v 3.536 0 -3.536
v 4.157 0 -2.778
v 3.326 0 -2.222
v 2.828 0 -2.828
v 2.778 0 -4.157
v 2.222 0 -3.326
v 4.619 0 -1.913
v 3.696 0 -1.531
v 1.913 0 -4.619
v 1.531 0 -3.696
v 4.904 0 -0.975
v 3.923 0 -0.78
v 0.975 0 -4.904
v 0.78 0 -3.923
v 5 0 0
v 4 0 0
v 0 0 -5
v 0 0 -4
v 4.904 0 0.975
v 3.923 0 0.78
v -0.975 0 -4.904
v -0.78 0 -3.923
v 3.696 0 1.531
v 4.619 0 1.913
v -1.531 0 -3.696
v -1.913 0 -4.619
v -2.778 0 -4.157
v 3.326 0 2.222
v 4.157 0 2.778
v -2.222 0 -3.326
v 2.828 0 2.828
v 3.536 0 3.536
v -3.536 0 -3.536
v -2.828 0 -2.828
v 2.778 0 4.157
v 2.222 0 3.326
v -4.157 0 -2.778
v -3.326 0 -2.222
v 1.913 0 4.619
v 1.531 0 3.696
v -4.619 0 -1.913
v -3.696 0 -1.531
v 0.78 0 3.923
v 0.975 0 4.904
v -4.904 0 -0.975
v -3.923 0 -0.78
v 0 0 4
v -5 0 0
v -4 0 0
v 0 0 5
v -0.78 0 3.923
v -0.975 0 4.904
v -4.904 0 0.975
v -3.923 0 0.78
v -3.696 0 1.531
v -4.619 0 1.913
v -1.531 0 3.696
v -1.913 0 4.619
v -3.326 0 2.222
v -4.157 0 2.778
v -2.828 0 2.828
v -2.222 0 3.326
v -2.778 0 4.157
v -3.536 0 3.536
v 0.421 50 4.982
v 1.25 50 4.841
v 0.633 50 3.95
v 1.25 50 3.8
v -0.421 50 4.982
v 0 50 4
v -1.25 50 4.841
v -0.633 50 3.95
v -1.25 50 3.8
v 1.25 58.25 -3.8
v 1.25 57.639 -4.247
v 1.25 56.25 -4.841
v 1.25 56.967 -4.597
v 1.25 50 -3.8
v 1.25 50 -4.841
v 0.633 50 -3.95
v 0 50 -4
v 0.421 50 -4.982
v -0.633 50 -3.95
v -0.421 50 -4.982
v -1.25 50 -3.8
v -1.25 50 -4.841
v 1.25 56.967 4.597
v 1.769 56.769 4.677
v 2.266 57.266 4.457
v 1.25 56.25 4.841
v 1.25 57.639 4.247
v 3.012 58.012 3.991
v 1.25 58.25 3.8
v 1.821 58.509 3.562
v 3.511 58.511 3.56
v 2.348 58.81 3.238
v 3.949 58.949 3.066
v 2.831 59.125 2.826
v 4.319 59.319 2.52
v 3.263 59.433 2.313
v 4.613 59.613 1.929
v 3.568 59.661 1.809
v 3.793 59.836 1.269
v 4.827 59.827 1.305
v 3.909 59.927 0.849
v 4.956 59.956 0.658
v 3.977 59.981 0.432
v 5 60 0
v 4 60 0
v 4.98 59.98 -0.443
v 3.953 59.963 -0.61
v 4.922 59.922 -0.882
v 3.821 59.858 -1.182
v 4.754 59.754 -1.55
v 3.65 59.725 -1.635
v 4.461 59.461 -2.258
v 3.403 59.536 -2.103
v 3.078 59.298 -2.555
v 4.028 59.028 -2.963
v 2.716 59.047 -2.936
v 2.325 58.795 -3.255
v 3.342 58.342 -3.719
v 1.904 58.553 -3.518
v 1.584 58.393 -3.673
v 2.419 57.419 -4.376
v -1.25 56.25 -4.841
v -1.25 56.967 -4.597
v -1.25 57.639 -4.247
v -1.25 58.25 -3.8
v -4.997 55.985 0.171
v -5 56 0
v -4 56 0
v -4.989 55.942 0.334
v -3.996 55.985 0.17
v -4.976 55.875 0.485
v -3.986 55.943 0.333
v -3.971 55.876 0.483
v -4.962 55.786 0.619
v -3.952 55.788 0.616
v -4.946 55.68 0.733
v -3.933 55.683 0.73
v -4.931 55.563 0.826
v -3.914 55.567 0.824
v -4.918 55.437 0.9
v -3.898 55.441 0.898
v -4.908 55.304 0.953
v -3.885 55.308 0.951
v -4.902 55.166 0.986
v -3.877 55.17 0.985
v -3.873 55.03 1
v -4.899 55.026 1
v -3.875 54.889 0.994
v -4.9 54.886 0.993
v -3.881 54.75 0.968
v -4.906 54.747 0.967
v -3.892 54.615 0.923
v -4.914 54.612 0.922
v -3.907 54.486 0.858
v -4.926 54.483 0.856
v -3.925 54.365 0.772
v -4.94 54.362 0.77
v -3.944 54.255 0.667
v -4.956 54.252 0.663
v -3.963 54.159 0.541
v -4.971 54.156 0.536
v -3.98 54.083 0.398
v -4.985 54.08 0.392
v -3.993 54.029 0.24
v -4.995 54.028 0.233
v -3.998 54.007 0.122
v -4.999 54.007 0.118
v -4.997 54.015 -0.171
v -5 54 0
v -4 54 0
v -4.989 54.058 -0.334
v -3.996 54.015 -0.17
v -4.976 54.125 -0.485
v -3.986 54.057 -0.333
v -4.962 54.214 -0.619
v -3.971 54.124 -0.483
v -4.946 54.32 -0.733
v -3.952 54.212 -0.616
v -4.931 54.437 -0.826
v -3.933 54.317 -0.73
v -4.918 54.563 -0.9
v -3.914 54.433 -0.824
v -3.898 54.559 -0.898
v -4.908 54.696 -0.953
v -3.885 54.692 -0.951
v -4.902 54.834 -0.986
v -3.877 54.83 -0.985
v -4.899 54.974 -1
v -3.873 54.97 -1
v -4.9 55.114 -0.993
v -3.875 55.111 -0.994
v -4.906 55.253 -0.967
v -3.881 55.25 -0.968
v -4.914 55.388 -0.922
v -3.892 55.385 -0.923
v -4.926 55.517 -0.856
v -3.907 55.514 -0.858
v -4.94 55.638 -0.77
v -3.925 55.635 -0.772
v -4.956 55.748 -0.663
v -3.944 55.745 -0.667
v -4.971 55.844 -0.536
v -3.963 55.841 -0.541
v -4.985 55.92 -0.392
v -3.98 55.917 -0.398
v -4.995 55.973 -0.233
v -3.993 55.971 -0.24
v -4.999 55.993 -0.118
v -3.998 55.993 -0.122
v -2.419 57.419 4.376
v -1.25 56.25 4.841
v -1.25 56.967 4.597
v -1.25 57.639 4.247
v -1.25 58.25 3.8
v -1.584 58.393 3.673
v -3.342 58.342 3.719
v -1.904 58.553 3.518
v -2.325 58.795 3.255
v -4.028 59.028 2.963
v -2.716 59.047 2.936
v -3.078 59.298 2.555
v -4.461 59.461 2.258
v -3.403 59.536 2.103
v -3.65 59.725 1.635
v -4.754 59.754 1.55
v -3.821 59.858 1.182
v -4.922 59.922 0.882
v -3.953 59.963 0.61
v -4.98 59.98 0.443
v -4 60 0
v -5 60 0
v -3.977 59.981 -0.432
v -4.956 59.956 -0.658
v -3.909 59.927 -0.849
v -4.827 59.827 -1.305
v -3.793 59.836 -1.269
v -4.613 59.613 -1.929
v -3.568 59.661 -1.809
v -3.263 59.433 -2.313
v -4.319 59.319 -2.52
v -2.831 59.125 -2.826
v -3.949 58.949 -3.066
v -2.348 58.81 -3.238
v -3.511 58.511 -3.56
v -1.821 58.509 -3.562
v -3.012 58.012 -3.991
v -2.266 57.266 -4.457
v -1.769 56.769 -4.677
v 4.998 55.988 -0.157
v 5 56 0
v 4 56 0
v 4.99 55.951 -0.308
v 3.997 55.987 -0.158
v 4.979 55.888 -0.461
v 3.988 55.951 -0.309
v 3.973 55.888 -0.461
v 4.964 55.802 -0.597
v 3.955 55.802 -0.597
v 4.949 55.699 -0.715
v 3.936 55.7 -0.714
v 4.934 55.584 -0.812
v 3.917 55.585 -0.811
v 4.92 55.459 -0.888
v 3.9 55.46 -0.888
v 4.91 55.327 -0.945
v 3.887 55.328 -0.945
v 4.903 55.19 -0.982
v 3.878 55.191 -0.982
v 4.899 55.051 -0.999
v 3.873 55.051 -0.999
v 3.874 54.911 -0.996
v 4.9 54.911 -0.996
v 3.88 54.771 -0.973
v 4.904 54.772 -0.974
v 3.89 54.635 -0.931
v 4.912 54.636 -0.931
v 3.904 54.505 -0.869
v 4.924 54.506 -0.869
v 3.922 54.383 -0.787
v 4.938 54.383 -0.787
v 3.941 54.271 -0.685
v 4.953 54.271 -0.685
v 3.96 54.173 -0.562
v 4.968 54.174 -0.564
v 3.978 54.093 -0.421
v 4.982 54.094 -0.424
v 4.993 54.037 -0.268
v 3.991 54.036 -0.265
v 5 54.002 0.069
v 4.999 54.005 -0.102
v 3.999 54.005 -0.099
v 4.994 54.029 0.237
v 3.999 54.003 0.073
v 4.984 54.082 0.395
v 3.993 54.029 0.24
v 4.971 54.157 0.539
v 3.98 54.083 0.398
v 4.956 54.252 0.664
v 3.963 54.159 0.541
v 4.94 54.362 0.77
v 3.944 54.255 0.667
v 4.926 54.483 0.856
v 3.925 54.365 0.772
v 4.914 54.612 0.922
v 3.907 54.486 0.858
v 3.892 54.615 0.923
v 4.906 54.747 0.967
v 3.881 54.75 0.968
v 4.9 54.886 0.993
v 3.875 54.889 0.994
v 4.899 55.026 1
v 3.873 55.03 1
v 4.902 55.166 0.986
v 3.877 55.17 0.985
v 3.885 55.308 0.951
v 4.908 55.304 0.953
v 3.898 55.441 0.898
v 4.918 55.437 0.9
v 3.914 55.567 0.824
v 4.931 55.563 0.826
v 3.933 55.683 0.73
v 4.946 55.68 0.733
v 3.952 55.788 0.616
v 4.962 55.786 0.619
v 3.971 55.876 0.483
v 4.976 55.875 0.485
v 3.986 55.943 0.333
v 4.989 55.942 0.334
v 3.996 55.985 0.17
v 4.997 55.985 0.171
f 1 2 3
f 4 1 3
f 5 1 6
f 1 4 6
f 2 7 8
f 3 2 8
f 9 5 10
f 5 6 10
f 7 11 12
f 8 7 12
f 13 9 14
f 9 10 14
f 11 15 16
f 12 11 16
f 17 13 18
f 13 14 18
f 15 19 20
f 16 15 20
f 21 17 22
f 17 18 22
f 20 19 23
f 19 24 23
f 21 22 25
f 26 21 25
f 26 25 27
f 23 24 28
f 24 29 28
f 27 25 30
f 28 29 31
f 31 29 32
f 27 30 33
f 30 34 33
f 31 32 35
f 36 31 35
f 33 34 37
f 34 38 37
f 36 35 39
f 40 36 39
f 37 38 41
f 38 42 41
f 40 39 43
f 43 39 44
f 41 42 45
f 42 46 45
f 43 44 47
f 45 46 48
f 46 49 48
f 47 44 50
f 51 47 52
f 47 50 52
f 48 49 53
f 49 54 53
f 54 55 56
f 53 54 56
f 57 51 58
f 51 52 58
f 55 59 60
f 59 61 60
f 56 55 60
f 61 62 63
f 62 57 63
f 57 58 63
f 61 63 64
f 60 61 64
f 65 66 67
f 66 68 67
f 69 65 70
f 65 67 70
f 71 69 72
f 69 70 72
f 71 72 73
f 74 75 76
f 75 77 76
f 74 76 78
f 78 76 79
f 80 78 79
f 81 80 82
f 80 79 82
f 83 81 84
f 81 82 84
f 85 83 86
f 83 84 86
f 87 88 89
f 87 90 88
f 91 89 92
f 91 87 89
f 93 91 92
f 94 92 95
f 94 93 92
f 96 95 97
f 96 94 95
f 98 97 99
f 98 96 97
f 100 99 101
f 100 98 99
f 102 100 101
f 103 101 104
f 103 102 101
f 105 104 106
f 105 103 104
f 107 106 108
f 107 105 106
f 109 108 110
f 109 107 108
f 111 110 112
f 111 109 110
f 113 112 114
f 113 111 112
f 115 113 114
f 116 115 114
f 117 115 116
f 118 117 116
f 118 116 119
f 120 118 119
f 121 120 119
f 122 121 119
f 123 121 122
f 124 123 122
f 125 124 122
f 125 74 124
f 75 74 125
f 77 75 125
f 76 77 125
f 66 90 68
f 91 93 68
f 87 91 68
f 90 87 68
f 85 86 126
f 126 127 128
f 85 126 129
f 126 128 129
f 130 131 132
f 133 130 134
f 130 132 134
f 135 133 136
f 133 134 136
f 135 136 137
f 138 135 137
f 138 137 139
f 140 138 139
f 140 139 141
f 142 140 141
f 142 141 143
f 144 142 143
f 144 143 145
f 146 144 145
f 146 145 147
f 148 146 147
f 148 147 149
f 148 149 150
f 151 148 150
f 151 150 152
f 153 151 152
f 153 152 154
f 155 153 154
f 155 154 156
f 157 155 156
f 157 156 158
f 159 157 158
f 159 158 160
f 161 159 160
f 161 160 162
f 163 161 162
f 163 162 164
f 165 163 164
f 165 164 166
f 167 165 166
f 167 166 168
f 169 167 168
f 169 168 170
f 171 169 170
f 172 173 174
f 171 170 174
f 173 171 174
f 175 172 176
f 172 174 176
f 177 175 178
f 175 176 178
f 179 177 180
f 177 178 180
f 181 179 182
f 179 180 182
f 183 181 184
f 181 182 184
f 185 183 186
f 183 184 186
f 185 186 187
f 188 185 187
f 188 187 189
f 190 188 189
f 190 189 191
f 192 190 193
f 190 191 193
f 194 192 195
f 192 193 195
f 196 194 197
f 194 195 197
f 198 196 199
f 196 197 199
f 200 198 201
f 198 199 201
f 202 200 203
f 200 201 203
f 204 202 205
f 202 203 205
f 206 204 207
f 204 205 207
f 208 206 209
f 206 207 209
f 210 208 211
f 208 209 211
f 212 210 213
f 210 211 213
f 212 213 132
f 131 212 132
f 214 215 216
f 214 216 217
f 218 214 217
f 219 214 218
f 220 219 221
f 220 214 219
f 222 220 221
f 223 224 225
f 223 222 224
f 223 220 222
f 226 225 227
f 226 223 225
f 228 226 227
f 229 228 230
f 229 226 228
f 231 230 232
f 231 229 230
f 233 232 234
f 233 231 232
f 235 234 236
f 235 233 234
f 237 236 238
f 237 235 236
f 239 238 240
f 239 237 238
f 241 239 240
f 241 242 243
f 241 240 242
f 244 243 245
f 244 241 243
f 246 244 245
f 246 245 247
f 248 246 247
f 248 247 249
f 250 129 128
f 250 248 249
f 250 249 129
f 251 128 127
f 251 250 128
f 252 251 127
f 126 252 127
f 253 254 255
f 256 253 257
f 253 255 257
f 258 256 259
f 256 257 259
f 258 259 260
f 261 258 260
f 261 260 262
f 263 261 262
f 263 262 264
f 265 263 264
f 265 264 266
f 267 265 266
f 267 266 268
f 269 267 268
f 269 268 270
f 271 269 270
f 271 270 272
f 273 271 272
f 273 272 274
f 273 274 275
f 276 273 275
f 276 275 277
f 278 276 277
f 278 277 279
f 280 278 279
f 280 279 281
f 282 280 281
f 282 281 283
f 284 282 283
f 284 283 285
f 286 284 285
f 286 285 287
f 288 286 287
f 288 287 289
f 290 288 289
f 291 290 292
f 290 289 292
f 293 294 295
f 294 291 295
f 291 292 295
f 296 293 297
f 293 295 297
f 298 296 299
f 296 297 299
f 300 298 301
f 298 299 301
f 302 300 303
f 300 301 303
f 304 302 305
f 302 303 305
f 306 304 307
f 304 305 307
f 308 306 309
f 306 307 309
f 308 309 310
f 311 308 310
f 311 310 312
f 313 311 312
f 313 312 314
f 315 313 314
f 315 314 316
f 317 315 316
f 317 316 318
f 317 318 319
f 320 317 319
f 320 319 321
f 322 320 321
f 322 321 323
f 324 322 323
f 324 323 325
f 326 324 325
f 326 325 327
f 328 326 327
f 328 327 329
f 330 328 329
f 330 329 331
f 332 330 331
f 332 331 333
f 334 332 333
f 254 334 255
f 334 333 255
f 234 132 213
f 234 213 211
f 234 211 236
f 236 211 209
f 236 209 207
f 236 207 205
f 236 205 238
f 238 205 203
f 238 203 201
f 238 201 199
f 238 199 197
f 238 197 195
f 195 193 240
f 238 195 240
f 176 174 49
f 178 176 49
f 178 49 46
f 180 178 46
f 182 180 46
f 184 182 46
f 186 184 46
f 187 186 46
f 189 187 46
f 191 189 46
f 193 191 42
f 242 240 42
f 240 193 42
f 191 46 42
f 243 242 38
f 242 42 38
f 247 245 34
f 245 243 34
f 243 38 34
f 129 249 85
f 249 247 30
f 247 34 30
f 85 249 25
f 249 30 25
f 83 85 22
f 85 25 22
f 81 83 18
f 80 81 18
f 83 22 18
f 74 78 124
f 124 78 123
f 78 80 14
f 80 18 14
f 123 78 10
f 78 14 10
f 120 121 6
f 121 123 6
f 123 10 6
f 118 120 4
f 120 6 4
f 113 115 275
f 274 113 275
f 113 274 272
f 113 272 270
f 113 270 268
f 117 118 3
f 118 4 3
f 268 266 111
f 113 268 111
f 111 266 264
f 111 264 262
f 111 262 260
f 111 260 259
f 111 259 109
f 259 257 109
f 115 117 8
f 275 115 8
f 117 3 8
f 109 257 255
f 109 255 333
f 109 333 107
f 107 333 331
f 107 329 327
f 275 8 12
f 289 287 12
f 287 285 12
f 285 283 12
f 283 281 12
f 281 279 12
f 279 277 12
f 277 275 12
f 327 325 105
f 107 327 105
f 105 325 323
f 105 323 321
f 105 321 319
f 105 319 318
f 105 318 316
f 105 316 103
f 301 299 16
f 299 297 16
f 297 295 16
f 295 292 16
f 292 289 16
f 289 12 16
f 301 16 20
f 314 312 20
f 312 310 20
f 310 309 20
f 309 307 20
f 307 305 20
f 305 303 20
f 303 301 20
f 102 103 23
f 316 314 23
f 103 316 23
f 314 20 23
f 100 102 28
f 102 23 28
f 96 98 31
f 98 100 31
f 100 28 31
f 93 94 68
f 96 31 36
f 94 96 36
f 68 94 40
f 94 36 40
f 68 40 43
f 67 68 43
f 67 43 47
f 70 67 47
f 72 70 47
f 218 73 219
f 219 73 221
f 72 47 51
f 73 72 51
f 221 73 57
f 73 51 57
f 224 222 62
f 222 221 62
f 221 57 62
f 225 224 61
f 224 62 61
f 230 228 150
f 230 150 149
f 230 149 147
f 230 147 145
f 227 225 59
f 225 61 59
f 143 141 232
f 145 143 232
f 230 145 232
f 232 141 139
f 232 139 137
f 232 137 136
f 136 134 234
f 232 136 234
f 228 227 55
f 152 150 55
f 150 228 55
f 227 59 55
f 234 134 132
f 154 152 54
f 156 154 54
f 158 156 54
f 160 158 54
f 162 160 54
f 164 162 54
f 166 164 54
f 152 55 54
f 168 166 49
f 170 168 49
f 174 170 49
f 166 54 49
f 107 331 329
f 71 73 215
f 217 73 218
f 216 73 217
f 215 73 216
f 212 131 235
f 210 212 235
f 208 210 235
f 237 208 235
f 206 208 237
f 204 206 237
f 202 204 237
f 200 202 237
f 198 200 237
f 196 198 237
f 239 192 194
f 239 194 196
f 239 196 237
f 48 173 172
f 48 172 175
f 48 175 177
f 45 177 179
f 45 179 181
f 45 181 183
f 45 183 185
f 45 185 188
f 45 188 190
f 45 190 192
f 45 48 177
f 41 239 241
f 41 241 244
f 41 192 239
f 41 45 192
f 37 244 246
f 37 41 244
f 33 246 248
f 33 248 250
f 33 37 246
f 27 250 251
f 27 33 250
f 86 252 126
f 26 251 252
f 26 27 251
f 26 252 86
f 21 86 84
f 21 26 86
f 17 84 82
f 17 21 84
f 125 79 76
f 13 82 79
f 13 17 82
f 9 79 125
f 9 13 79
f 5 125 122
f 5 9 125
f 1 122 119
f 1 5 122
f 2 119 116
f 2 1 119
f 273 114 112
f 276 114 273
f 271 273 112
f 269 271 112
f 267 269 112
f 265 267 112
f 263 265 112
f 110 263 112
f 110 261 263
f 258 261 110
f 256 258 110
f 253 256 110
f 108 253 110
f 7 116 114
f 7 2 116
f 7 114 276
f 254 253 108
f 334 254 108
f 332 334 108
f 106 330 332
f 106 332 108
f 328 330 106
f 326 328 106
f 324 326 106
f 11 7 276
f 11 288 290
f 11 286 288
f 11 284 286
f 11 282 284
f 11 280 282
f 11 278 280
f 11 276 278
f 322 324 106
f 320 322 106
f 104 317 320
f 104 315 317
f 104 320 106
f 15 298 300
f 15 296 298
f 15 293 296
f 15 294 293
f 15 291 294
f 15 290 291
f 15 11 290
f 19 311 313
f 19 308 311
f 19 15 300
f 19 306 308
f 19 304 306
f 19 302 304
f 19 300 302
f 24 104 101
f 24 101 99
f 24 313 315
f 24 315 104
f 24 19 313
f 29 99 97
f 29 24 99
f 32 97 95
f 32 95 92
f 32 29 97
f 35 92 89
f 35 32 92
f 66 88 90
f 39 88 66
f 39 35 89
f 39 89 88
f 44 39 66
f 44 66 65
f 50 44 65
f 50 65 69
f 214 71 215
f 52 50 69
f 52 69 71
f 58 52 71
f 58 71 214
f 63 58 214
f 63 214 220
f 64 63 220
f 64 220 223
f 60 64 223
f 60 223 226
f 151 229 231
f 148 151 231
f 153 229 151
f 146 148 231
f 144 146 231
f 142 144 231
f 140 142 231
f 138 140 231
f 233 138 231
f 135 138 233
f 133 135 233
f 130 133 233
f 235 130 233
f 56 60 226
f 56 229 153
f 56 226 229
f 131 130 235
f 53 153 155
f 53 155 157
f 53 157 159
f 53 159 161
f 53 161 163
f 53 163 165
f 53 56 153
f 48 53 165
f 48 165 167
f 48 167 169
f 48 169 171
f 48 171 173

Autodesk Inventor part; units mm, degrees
ref_plane "YZ Plane" through (0, 0, 0) normal (1, 0, 0) x (0, 1, 0)
ref_plane "XZ Plane" through (0, 0, 0) normal (0, 1, 0) x (-1, 0, 0)
ref_plane "XY Plane" through (0, 0, 0) normal (0, 0, 1) x (1, 0, 0)
sketch "Sketch1" plane through (0, 0, 0) normal (0, 1, 0) x (-1, 0, 0)
  circle A0 centre (0, 0) radius 5
  circle A1 centre (0, 0) radius 4
  dimension "d0" = 10
  dimension "d1" = 8
extrude "Extrusion1" add sketch "Sketch1" along normal blind 60
sketch "Sketch2" plane through (0, 0, 0) normal (1, 0, 0) x (0, 1, 0)
  circle A0 centre (55, 0) radius 5
  line L0 (60, 4) -> (60, -4) projected
  circle A1 centre (55, 0) radius 1
  line L1 (55, -5) -> (60, -5)
  line L2 (0, -5) -> (60, -5) projected
  line L3 (60, -5) -> (60, 5) projected
  line L4 (55, 5) -> (60, 5)
  line L5 (60, 5) -> (60, -5)
  point P0 (0, 0)
  point P1 (60, 0)
  point P2 (60, 0)
  dimension "d4" = 10
  dimension "d5" = 5
  dimension "d6" = 0
  dimension "d7" = 2
extrude "Extrusion2" cut sketch "Sketch2" along normal through all both and the other way through all contours L0 L3 L1 A0 | A0 L4 L3 L0 | A1
sketch "Sketch3" plane through (0, 0, 0) normal (0, 0, 1) x (1, 0, 0)
  line L0 (-1.25, 60) -> (1.25, 60)
  line L1 (1.25, 60) -> (1.25, 50)
  line L2 (1.25, 50) -> (-1.25, 50)
  line L3 (-1.25, 50) -> (-1.25, 60)
  line L4 (-5, 0) -> (-5, 60) projected
  line L5 (5, 60) -> (-5, 60) projected
  point P0 (0, 0)
  point P1 (0, 50)
  dimension "d10" = 2.5
  dimension "d11" = 10
  dimension "d12" = 0
  dimension "d13" = 5
extrude "Extrusion3" cut sketch "Sketch3" along normal through all both and the other way through all
properties part number "Shaft" material "Stainless Steel"
